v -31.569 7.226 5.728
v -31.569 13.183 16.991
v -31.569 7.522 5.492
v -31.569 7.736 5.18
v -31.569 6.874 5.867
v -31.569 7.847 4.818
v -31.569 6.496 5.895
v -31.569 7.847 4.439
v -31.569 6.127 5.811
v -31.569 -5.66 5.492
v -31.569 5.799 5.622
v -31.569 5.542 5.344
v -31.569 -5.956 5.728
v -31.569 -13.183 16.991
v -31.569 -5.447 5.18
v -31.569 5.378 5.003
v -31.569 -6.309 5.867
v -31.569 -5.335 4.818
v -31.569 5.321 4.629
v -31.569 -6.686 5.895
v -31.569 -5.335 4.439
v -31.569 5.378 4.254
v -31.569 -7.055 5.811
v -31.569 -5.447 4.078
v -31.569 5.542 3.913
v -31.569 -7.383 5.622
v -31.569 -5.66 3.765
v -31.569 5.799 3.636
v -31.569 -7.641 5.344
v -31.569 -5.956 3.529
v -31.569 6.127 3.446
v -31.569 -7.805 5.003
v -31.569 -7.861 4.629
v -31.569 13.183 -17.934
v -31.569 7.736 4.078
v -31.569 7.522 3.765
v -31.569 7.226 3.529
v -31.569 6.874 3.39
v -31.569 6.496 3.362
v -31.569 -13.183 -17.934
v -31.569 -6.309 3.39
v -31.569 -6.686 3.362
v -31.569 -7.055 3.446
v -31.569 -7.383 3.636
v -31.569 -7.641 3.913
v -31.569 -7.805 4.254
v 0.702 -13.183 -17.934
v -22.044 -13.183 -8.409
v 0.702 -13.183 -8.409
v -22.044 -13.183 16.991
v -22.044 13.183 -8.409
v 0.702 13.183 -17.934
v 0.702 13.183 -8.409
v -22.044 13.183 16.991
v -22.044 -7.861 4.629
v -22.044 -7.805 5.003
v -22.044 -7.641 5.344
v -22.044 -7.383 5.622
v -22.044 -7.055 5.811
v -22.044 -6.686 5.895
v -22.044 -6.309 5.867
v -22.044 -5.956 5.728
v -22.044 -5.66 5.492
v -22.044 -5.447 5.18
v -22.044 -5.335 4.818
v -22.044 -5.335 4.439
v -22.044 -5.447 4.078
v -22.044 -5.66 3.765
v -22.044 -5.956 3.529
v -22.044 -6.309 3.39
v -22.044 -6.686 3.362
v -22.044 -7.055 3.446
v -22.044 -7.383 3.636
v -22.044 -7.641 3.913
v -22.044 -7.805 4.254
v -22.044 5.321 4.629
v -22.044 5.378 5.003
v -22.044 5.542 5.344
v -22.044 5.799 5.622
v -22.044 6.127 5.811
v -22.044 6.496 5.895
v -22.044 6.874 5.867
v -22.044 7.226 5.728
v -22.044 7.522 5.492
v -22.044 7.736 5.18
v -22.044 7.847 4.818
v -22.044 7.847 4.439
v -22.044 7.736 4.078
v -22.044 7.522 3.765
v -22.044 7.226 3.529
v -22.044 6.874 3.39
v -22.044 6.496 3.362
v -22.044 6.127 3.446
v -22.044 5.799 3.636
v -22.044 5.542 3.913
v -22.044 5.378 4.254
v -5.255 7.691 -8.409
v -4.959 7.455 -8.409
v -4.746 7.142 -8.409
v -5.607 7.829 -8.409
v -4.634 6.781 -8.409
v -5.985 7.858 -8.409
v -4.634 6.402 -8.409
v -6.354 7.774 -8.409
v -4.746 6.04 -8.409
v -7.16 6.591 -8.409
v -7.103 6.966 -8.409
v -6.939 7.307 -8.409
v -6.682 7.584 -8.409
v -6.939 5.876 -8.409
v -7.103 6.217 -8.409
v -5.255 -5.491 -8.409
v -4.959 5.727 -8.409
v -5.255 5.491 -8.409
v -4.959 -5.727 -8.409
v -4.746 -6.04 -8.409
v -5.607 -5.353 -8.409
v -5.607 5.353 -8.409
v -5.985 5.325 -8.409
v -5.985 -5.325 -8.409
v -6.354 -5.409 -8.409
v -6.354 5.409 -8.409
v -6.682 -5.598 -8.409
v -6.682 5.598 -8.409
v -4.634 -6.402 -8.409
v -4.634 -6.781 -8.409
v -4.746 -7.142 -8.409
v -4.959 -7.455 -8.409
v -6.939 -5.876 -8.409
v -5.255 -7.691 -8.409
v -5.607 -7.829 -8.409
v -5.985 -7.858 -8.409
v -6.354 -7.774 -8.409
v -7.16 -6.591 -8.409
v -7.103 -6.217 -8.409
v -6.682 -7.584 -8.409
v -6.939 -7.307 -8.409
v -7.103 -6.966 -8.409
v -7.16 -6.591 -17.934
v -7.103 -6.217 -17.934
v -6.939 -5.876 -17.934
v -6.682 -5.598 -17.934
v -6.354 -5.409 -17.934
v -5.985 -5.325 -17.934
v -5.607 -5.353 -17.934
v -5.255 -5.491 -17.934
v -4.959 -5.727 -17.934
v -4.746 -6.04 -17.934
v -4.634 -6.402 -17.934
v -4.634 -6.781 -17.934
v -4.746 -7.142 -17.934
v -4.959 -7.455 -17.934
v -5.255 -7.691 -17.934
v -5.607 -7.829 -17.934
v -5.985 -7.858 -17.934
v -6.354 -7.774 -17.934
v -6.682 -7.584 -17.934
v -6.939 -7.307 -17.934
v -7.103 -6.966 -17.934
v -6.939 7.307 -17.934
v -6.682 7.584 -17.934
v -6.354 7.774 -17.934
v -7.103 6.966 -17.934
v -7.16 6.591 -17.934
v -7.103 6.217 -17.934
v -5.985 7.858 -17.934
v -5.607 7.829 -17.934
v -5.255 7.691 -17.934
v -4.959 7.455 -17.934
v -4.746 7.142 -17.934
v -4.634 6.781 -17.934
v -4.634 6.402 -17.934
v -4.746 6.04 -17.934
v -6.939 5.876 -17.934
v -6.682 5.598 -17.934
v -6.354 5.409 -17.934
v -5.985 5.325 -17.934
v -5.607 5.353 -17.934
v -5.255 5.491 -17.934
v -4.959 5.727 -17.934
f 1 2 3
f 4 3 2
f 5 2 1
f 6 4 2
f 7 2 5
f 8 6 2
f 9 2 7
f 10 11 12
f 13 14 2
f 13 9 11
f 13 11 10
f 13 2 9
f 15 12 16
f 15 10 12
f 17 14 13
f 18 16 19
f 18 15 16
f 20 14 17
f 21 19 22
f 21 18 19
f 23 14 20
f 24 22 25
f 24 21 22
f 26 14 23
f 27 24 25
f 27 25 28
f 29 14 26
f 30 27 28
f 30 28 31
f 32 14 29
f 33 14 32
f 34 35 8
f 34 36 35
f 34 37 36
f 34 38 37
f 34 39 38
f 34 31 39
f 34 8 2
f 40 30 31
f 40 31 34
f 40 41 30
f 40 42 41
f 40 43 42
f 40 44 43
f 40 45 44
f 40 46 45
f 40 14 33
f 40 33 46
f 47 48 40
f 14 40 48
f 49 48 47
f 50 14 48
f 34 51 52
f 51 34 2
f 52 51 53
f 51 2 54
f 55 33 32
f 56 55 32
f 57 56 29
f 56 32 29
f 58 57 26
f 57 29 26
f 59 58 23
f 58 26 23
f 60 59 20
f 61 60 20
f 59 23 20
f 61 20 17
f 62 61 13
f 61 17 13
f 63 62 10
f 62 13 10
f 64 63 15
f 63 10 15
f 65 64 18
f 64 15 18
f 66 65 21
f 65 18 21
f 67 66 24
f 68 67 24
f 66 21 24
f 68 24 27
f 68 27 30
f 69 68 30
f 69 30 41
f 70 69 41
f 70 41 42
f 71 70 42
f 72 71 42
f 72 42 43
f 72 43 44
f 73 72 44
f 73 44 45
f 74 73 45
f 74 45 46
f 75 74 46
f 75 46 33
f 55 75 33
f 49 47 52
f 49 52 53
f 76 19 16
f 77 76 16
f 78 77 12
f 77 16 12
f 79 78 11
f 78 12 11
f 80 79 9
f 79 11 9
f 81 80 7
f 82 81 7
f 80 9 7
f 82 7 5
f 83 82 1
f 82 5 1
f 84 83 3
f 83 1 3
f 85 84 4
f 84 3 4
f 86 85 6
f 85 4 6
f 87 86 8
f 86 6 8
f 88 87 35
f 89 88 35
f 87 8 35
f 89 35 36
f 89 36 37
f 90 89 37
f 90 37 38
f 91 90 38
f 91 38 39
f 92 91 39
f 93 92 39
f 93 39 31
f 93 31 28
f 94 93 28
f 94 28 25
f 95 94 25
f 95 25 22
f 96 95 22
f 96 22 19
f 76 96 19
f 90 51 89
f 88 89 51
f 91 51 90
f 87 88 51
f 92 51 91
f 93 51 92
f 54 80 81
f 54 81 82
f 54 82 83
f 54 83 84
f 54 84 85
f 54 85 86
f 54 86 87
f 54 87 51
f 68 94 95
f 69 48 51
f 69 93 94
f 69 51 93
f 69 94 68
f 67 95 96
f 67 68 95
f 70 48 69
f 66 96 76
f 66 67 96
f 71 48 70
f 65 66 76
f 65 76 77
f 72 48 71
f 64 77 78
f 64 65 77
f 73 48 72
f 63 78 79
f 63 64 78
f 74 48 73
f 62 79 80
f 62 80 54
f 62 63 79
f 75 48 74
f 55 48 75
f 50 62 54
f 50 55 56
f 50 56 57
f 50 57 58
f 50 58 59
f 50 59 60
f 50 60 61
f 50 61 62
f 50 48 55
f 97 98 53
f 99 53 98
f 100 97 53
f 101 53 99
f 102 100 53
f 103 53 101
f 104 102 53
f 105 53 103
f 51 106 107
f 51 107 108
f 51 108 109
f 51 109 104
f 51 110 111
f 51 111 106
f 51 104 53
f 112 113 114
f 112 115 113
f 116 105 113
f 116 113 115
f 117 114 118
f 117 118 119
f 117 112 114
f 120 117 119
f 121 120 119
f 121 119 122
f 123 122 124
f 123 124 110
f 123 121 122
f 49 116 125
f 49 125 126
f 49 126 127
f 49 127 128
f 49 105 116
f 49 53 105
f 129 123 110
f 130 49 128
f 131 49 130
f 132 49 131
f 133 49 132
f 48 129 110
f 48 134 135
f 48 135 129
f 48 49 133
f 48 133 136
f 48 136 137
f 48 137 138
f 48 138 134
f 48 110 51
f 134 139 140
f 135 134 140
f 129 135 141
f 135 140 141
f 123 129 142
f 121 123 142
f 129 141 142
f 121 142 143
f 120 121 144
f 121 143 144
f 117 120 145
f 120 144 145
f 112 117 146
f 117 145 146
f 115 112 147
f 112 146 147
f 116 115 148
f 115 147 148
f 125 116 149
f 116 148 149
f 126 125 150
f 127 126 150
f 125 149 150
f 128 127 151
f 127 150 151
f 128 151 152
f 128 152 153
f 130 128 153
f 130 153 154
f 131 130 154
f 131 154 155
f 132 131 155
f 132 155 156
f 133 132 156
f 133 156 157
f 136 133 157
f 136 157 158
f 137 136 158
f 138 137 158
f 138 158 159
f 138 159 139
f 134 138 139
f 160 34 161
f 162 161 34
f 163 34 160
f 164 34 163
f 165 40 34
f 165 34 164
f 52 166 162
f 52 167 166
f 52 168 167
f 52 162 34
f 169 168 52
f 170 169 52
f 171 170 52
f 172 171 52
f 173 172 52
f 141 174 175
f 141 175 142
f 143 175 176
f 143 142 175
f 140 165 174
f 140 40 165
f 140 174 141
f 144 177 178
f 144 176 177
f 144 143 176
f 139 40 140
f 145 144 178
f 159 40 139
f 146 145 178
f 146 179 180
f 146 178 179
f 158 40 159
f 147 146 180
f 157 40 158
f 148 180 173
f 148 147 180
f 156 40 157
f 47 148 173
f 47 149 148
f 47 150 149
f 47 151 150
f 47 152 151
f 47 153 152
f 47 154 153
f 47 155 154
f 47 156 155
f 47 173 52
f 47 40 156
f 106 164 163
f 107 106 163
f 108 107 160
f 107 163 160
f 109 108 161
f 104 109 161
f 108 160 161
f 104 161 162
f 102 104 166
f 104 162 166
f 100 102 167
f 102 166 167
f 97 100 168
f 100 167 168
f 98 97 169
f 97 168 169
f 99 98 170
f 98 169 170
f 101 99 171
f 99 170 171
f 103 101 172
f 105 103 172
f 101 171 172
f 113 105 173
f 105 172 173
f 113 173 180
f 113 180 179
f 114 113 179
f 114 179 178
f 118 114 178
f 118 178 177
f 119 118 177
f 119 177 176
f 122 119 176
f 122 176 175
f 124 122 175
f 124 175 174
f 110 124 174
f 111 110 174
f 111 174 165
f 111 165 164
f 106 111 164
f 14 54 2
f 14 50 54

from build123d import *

# Parameters (mm, degrees)
F1_DEPTH = 13.1826
F3_D     = 2.54
F5_D     = 2.54


with BuildPart() as f1:
    # F0 (on Front) → F1 (new body, symmetric)
    with BuildSketch(Plane.XZ):
        Polygon((-22.04417, 16.991249), (-31.56917, 16.991249), (-31.56917, -17.933751), (0.70153, -17.933751), (0.70153, -8.408751), (-22.04417, -8.408751), align=None)
    extrude(amount=F1_DEPTH, both=True)

    # F3 (through all)
    with Locations(Plane.XY.offset(-8.408751)):
        with Locations((-5.88977, 6.5913), (-5.88977, -6.5913)):
            Hole(F3_D / 2)

    # F5 (through all)
    with Locations(Plane.YZ.offset(-22.04417)):
        with Locations((-6.5913, 4.62864), (6.5913, 4.62864)):
            Hole(F5_D / 2)


solid = f1.part
